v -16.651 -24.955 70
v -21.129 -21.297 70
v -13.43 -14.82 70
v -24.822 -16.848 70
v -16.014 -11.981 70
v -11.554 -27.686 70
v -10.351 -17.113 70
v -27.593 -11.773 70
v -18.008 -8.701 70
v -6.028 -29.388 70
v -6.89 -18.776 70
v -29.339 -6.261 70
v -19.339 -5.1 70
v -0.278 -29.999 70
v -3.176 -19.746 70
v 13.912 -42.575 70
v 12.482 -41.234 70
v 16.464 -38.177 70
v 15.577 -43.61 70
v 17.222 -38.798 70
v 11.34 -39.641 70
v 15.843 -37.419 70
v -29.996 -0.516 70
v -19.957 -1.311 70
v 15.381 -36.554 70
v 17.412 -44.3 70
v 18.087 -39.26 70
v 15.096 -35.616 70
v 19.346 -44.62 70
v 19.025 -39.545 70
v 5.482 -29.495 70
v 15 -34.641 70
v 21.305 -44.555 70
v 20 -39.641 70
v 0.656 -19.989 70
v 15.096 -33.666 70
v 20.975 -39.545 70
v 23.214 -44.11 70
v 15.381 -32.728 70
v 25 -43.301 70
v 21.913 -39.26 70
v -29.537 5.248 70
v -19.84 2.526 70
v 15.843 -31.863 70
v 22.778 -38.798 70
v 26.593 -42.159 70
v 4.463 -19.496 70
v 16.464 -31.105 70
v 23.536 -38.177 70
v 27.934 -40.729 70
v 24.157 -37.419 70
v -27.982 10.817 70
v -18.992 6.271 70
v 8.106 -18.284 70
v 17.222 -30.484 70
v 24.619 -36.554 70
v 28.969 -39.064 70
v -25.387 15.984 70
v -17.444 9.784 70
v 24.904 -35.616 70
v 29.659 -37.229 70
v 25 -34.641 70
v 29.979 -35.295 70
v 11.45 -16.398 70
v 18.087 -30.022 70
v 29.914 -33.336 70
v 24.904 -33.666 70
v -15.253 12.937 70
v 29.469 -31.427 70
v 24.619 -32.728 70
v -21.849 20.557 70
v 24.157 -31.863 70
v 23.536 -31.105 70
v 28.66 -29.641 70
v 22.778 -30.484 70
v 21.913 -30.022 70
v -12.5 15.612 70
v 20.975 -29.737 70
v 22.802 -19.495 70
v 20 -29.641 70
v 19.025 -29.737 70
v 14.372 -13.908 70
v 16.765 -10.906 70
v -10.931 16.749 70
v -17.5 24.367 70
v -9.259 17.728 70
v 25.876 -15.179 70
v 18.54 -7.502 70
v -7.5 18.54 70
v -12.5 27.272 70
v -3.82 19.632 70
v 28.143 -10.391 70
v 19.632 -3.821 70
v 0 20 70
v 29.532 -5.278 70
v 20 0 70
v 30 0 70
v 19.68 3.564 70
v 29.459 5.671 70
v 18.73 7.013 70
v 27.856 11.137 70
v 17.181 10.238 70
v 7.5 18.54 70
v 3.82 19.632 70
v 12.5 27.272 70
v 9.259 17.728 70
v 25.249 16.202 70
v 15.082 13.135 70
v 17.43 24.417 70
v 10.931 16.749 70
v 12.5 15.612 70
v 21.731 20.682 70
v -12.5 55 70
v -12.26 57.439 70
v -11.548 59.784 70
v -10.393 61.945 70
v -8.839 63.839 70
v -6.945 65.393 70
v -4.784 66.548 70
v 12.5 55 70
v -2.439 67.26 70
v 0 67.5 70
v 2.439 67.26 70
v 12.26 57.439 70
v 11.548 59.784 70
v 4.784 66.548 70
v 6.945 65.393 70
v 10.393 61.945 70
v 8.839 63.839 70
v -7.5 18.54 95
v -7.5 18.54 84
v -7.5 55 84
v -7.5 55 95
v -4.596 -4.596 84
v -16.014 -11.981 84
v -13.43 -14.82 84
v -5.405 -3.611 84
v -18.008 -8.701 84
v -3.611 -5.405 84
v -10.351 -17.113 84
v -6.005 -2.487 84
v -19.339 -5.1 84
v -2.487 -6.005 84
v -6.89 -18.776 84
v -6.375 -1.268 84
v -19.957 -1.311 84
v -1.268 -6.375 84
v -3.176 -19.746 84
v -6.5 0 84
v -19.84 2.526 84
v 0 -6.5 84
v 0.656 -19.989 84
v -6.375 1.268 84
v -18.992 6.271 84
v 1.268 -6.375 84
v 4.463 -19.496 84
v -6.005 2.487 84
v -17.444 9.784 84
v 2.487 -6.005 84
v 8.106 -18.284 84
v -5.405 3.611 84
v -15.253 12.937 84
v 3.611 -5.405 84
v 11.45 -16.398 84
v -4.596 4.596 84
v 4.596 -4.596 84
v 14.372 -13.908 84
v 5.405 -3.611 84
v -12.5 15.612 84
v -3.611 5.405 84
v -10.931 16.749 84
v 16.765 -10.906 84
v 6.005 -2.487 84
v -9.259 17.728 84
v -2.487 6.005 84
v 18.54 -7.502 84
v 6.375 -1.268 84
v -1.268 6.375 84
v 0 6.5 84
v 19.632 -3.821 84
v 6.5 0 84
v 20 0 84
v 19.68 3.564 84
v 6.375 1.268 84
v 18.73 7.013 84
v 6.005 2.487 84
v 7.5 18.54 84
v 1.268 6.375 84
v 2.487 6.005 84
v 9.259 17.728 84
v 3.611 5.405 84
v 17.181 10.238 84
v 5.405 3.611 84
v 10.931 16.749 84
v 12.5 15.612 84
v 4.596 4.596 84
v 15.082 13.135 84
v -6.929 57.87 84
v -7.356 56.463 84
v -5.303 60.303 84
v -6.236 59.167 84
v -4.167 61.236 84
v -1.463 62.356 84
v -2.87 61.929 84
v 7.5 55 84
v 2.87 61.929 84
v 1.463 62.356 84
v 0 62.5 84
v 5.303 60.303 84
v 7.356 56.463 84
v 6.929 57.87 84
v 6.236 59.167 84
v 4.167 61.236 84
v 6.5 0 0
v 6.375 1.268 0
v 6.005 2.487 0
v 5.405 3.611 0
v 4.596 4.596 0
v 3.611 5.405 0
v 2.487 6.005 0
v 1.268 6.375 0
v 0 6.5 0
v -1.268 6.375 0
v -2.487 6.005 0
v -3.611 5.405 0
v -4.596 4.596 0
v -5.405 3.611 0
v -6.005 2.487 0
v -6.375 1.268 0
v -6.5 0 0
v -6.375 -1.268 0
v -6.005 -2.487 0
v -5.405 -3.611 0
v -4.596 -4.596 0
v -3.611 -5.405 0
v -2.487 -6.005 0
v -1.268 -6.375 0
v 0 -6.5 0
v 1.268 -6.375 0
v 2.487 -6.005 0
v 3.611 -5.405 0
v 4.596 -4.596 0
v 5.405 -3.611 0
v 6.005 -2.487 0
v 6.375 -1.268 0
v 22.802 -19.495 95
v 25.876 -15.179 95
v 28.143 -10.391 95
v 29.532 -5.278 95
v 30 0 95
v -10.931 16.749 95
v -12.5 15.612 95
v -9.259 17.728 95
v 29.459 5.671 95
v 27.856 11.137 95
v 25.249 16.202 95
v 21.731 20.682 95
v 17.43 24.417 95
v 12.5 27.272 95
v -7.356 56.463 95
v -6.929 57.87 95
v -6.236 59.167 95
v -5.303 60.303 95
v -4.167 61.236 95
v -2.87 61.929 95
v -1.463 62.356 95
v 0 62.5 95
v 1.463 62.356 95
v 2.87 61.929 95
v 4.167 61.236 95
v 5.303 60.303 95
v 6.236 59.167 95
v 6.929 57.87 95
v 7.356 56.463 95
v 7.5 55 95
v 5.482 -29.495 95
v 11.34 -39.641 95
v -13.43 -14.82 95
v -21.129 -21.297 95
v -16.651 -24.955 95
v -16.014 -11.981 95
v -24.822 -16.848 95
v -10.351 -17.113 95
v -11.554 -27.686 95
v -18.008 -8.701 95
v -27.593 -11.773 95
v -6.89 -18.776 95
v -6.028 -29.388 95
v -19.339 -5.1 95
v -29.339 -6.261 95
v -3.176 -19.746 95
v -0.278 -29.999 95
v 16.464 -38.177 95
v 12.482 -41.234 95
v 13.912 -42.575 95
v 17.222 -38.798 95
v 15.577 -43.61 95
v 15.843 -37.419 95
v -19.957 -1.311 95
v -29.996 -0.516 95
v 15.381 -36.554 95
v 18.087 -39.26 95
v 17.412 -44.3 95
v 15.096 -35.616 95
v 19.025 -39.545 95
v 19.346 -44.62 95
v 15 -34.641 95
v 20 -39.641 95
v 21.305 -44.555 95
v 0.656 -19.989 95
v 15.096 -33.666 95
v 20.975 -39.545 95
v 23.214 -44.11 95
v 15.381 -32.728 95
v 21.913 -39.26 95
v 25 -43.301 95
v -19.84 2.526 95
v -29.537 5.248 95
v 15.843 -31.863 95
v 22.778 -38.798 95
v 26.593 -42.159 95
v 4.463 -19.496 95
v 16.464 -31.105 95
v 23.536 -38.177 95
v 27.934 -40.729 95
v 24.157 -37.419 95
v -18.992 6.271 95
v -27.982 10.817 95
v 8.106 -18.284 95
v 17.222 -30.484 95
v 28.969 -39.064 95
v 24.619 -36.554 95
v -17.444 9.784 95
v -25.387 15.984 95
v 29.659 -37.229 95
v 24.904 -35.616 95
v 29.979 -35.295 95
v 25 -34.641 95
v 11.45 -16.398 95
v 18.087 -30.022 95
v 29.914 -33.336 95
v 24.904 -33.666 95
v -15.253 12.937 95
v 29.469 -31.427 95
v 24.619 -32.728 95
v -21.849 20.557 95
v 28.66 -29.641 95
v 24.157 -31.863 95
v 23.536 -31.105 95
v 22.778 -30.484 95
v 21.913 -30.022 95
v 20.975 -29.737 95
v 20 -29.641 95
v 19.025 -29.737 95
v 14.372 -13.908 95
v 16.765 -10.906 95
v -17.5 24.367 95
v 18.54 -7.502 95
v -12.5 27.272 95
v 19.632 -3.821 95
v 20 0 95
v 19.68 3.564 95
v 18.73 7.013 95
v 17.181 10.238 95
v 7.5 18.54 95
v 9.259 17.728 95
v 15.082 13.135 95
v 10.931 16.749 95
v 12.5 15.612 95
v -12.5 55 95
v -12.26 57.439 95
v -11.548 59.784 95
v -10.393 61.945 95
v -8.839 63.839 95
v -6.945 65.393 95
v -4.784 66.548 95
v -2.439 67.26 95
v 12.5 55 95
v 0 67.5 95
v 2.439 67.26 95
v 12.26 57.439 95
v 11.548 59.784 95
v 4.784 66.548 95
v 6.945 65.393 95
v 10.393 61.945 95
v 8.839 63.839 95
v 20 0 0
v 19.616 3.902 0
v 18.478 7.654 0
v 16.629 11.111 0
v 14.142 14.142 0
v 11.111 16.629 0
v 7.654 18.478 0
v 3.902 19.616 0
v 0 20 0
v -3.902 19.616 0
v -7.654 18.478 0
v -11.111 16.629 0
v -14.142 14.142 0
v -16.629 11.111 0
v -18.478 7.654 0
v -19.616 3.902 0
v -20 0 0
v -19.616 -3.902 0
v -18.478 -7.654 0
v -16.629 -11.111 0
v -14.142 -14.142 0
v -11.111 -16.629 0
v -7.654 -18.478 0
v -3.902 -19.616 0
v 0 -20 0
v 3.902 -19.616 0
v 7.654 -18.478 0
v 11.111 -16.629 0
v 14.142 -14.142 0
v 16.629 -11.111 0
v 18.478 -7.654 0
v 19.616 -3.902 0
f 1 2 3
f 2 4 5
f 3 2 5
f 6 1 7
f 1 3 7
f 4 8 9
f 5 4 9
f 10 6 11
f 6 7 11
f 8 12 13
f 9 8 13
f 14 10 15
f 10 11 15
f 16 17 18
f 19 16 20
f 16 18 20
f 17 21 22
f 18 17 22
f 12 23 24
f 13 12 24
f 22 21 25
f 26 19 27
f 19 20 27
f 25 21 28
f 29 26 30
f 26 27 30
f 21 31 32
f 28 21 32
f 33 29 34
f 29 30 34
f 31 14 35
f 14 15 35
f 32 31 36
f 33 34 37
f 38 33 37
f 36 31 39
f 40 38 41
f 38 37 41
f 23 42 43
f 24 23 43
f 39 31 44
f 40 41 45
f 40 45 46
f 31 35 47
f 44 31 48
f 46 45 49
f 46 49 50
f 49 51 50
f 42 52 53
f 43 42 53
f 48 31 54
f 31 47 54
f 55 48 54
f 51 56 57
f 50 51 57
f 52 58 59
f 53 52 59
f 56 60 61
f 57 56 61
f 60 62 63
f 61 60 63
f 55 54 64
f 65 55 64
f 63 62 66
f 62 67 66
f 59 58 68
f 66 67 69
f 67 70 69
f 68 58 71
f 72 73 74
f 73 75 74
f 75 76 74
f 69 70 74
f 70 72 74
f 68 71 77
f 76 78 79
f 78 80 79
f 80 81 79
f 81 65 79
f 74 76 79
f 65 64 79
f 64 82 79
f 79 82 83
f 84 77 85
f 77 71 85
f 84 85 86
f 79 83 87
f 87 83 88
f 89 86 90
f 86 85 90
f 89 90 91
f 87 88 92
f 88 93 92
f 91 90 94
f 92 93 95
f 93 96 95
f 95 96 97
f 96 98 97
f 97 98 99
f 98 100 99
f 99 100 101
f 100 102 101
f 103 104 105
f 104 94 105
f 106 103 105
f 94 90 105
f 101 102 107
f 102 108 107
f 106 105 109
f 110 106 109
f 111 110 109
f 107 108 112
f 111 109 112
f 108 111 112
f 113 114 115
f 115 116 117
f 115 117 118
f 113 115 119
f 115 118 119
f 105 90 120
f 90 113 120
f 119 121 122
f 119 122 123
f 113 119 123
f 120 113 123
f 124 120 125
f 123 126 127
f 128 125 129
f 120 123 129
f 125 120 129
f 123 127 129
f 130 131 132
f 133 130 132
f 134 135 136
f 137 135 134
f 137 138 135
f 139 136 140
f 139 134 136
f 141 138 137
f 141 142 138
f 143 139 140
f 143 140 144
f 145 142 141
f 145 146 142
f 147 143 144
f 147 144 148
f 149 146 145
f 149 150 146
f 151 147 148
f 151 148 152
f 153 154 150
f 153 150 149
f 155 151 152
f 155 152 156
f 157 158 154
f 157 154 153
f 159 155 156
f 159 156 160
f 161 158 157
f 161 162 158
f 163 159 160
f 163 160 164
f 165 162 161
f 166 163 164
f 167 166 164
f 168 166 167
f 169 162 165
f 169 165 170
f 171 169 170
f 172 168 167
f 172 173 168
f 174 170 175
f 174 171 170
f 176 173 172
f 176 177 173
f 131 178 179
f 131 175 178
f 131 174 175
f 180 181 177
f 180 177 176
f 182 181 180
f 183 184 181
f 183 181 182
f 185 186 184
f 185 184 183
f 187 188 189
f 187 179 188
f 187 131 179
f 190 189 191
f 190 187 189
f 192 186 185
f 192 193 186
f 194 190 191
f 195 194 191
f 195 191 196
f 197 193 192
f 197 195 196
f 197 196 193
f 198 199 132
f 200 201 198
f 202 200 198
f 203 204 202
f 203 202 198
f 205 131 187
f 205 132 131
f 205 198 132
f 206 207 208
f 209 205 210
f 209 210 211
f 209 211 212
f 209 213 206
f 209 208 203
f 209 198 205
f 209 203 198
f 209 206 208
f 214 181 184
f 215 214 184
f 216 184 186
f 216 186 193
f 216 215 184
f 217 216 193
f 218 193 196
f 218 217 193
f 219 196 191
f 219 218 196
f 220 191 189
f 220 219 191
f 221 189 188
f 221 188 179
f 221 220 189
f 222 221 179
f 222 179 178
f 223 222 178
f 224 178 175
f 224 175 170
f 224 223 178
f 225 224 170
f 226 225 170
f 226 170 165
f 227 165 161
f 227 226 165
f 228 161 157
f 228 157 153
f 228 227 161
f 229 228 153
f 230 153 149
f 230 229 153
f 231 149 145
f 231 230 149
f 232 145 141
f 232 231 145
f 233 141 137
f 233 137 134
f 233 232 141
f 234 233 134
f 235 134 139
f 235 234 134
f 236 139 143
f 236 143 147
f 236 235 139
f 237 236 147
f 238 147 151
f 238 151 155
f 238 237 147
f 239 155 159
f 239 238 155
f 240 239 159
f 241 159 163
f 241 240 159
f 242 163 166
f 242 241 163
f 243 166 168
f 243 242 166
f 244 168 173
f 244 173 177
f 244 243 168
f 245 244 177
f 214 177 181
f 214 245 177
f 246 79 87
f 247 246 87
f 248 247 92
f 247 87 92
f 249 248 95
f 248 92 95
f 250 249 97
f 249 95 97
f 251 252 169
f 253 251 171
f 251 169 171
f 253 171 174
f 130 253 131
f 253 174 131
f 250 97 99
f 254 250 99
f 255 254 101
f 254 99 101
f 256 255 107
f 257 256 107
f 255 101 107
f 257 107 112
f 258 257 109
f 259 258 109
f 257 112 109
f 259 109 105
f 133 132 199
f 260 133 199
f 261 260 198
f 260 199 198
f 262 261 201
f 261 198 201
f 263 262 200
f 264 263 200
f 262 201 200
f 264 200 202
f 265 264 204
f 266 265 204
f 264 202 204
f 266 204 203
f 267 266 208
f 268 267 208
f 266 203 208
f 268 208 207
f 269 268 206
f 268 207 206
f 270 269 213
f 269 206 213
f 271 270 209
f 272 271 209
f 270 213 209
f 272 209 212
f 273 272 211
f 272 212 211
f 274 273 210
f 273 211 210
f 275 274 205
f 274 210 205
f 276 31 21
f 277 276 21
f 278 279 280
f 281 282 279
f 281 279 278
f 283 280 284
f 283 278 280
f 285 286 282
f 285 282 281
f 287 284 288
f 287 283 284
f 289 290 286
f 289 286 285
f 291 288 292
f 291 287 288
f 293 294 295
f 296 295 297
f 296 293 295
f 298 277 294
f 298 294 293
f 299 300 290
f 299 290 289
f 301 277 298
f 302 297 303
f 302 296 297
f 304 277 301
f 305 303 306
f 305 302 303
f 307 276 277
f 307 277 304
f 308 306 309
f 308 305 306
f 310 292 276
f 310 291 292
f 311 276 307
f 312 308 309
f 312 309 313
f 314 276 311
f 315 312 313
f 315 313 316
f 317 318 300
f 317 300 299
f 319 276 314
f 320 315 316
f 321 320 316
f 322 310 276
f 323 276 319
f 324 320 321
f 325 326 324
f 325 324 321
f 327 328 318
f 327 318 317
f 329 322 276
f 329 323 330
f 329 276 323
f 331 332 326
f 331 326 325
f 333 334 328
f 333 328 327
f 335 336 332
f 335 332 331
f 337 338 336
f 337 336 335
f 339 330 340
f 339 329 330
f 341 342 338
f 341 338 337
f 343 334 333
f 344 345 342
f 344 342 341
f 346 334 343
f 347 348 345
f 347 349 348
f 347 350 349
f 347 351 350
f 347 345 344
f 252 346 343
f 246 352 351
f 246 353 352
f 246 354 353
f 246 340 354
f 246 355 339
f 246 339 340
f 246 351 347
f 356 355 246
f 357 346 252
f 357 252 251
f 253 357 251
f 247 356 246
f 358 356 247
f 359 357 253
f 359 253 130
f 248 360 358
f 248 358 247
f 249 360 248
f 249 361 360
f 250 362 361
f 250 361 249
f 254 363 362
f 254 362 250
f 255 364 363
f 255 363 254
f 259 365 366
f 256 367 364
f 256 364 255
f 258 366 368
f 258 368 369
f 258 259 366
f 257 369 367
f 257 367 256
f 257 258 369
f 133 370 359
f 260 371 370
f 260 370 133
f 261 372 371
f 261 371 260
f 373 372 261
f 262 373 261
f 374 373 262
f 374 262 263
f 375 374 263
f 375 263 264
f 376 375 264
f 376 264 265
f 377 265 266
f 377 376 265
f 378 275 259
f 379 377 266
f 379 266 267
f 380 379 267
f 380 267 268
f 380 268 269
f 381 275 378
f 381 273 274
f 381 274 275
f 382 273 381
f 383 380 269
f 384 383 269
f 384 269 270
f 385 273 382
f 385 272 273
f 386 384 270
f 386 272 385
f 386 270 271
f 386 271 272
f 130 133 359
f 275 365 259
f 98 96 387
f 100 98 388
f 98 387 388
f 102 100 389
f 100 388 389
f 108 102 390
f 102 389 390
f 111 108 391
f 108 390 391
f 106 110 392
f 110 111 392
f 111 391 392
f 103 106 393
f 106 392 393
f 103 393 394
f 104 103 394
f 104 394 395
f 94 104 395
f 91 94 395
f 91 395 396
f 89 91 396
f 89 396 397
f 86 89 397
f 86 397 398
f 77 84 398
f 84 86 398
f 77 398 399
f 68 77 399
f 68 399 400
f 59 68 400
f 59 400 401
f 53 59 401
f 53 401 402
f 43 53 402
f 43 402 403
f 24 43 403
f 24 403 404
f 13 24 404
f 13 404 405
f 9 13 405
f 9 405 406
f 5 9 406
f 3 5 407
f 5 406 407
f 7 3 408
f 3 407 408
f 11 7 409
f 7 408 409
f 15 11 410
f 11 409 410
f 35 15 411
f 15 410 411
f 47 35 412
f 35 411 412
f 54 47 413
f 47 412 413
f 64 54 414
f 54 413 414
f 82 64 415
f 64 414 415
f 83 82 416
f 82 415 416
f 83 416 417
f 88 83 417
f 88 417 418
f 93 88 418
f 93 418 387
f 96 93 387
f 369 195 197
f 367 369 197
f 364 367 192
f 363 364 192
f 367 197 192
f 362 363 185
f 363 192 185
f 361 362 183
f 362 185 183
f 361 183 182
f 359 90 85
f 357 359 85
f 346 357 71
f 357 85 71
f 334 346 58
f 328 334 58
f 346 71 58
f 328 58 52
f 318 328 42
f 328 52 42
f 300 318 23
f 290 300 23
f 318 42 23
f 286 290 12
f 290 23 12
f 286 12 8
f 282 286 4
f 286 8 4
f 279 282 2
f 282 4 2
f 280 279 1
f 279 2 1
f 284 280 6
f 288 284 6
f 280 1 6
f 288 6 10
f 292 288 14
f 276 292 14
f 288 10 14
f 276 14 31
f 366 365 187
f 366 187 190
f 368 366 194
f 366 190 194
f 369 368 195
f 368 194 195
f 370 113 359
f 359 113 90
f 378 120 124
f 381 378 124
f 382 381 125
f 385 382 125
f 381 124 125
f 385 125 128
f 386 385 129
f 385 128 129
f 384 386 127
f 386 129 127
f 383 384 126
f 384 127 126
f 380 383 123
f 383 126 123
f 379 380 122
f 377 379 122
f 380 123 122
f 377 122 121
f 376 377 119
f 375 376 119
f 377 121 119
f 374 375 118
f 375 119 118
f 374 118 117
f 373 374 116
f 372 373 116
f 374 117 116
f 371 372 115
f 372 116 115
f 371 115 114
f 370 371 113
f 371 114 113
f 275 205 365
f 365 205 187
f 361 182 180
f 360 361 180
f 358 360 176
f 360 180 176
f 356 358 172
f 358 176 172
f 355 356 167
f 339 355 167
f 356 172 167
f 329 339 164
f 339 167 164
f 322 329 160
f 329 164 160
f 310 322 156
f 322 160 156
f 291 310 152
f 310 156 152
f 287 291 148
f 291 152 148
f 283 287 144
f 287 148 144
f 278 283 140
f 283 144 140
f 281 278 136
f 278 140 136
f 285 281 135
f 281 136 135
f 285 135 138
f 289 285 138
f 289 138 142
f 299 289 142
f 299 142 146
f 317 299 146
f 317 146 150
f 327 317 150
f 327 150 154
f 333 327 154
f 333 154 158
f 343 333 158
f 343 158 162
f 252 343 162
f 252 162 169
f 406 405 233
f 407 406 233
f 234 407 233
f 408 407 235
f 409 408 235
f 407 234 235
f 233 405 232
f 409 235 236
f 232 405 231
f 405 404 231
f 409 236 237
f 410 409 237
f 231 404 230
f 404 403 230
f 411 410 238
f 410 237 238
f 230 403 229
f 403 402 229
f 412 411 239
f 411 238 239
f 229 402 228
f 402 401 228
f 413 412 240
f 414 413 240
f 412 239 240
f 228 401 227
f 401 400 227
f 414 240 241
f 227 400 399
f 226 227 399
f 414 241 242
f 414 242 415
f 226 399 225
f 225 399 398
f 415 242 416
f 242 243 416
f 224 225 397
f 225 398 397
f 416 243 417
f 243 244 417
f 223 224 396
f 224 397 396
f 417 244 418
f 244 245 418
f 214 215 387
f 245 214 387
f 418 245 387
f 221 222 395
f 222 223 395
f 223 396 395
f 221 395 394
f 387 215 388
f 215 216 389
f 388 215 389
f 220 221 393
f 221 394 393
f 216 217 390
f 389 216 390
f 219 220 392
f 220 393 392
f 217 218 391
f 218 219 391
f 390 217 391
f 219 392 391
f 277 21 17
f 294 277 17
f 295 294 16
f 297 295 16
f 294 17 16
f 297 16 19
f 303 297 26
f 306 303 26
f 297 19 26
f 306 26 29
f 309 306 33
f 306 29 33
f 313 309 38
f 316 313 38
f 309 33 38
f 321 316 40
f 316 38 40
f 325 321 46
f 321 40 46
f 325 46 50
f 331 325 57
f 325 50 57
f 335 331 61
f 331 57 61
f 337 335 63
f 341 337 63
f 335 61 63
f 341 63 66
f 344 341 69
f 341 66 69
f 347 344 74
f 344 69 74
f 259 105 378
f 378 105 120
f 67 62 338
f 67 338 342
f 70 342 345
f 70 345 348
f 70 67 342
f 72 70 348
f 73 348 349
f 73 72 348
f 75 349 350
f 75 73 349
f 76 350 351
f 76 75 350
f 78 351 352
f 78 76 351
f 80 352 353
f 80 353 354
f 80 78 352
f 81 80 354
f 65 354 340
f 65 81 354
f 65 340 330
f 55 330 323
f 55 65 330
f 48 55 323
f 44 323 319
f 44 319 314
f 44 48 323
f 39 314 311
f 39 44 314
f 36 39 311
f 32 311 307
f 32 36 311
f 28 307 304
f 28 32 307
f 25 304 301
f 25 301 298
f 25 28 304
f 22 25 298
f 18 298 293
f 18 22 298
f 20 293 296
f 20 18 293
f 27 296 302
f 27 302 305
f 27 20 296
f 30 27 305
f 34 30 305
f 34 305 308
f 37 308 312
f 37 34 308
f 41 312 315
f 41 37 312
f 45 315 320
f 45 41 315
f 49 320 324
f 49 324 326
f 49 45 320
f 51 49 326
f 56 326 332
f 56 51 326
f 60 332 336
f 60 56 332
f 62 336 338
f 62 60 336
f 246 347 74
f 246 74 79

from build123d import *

# Parameters (mm, degrees)
SKETCH_1_R      = 20
SKETCH_1_R_2    = 6.5
EXTRUDE_1_DEPTH = 70
EXTRUDE_2_DEPTH = 25
SKETCH_2_4_R    = 6.5
EXTRUDE_4_DEPTH = 1
EXTRUDE_START   = -25
SKETCH_3_R      = 5
EXTRUDE_5_DEPTH = 25
SKETCH_4_R      = 6.5
EXTRUDE_6_DEPTH = 13


with BuildPart() as part:
    # Эскиз1 → Бобышка-Вытянуть1 (new body)
    with BuildSketch(Plane.XY):
        Circle(SKETCH_1_R)
        Circle(SKETCH_1_R_2, mode=Mode.SUBTRACT)
    extrude(amount=EXTRUDE_1_DEPTH)



with BuildPart() as body_2:
    # Эскиз2 → Бобышка-Вытянуть2 (new body)
    with BuildSketch(Plane.XY.offset(70)):
        with BuildLine():
            ThreePointArc((20, 0), (-8.660254038, -18.027756377), (-12.5, 15.612494996))
            Line((-12.5, 15.612494996), (-12.5, 27.271780287))
            ThreePointArc((-12.5, 27.271780287), (-16.201851746, -25.248762346), (30, 0))
            ThreePointArc((30, 0), (25.248762346, 16.201851746), (12.5, 27.271780287))
            Line((12.5, 27.271780287), (12.5, 15.612494996))
            ThreePointArc((12.5, 15.612494996), (18.027756377, 8.660254038), (20, 0))
        make_face()
        with BuildLine():
            Line((-12.5, 27.271780287), (-12.5, 15.612494996))
            ThreePointArc((-12.5, 15.612494996), (-10.106596746, 17.258525494), (-7.5, 18.540496218))
            Line((-7.5, 18.540496218), (-7.5, 29.047375097))
            ThreePointArc((-7.5, 29.047375097), (-10.039331862, 28.270334554), (-12.5, 27.271780287))
        make_face()
        with BuildLine():
            ThreePointArc((7.5, 18.540496218), (10.106596746, 17.258525494), (12.5, 15.612494996))
            Line((12.5, 15.612494996), (12.5, 27.271780287))
            ThreePointArc((12.5, 27.271780287), (10.039331862, 28.270334554), (7.5, 29.047375097))
            Line((7.5, 29.047375097), (7.5, 18.540496218))
        make_face()
        with BuildLine():
            Line((-12.5, 55), (-12.5, 27.271780287))
            ThreePointArc((-12.5, 27.271780287), (-10.039331862, 28.270334554), (-7.5, 29.047375097))
            Line((-7.5, 29.047375097), (-7.5, 55))
            ThreePointArc((-7.5, 55), (0, 62.5), (7.5, 55))
            Line((7.5, 55), (7.5, 29.047375097))
            ThreePointArc((7.5, 29.047375097), (10.039331862, 28.270334554), (12.5, 27.271780287))
            Line((12.5, 27.271780287), (12.5, 55))
            ThreePointArc((12.5, 55), (0, 67.5), (-12.5, 55))
        make_face()
    extrude(amount=EXTRUDE_2_DEPTH)


with BuildPart() as part_1:
    add(part.part)

    add(body_2.part)  # Бобышка-Вытянуть4 merges body 2
    # Эскиз2<4> → Бобышка-Вытянуть4 (add)
    with BuildSketch(Plane.XY.offset(70)):
        with BuildLine():
            Line((7.5, 18.540496218), (7.5, 55))
            ThreePointArc((7.5, 55), (0, 62.5), (-7.5, 55))
            Line((-7.5, 55), (-7.5, 18.540496218))
            ThreePointArc((-7.5, 18.540496218), (0, -20), (7.5, 18.540496218))
        make_face()
        Circle(SKETCH_2_4_R, mode=Mode.SUBTRACT)
    extrude(amount=EXTRUDE_4_DEPTH)

    # Эскиз3 → Бобышка-Вытянуть5 (add)
    with BuildSketch(Plane.XY.offset(95).offset(EXTRUDE_START)):
        with BuildLine():
            Line((28.660254038, -29.641016151), (22.802389662, -19.494897428))
            ThreePointArc((22.802389662, -19.494897428), (15, -25.980762114), (5.481881586, -29.494897428))
            Line((5.481881586, -29.494897428), (11.339745962, -39.641016151))
            ThreePointArc((11.339745962, -39.641016151), (25, -43.301270189), (28.660254038, -29.641016151))
        make_face()
        with Locations((20, -34.641016151)):
            Circle(SKETCH_3_R, mode=Mode.SUBTRACT)
    extrude(amount=EXTRUDE_5_DEPTH)

    # Эскиз4 → Бобышка-Вытянуть6 (add)
    with BuildSketch(Plane.XY.offset(71)):
        with BuildLine():
            Line((7.5, 18.540496218), (7.5, 55))
            ThreePointArc((7.5, 55), (0, 62.5), (-7.5, 55))
            Line((-7.5, 55), (-7.5, 18.540496218))
            ThreePointArc((-7.5, 18.540496218), (0, -20), (7.5, 18.540496218))
        make_face()
        Circle(SKETCH_4_R, mode=Mode.SUBTRACT)
    extrude(amount=EXTRUDE_6_DEPTH)


solid = part_1.part
